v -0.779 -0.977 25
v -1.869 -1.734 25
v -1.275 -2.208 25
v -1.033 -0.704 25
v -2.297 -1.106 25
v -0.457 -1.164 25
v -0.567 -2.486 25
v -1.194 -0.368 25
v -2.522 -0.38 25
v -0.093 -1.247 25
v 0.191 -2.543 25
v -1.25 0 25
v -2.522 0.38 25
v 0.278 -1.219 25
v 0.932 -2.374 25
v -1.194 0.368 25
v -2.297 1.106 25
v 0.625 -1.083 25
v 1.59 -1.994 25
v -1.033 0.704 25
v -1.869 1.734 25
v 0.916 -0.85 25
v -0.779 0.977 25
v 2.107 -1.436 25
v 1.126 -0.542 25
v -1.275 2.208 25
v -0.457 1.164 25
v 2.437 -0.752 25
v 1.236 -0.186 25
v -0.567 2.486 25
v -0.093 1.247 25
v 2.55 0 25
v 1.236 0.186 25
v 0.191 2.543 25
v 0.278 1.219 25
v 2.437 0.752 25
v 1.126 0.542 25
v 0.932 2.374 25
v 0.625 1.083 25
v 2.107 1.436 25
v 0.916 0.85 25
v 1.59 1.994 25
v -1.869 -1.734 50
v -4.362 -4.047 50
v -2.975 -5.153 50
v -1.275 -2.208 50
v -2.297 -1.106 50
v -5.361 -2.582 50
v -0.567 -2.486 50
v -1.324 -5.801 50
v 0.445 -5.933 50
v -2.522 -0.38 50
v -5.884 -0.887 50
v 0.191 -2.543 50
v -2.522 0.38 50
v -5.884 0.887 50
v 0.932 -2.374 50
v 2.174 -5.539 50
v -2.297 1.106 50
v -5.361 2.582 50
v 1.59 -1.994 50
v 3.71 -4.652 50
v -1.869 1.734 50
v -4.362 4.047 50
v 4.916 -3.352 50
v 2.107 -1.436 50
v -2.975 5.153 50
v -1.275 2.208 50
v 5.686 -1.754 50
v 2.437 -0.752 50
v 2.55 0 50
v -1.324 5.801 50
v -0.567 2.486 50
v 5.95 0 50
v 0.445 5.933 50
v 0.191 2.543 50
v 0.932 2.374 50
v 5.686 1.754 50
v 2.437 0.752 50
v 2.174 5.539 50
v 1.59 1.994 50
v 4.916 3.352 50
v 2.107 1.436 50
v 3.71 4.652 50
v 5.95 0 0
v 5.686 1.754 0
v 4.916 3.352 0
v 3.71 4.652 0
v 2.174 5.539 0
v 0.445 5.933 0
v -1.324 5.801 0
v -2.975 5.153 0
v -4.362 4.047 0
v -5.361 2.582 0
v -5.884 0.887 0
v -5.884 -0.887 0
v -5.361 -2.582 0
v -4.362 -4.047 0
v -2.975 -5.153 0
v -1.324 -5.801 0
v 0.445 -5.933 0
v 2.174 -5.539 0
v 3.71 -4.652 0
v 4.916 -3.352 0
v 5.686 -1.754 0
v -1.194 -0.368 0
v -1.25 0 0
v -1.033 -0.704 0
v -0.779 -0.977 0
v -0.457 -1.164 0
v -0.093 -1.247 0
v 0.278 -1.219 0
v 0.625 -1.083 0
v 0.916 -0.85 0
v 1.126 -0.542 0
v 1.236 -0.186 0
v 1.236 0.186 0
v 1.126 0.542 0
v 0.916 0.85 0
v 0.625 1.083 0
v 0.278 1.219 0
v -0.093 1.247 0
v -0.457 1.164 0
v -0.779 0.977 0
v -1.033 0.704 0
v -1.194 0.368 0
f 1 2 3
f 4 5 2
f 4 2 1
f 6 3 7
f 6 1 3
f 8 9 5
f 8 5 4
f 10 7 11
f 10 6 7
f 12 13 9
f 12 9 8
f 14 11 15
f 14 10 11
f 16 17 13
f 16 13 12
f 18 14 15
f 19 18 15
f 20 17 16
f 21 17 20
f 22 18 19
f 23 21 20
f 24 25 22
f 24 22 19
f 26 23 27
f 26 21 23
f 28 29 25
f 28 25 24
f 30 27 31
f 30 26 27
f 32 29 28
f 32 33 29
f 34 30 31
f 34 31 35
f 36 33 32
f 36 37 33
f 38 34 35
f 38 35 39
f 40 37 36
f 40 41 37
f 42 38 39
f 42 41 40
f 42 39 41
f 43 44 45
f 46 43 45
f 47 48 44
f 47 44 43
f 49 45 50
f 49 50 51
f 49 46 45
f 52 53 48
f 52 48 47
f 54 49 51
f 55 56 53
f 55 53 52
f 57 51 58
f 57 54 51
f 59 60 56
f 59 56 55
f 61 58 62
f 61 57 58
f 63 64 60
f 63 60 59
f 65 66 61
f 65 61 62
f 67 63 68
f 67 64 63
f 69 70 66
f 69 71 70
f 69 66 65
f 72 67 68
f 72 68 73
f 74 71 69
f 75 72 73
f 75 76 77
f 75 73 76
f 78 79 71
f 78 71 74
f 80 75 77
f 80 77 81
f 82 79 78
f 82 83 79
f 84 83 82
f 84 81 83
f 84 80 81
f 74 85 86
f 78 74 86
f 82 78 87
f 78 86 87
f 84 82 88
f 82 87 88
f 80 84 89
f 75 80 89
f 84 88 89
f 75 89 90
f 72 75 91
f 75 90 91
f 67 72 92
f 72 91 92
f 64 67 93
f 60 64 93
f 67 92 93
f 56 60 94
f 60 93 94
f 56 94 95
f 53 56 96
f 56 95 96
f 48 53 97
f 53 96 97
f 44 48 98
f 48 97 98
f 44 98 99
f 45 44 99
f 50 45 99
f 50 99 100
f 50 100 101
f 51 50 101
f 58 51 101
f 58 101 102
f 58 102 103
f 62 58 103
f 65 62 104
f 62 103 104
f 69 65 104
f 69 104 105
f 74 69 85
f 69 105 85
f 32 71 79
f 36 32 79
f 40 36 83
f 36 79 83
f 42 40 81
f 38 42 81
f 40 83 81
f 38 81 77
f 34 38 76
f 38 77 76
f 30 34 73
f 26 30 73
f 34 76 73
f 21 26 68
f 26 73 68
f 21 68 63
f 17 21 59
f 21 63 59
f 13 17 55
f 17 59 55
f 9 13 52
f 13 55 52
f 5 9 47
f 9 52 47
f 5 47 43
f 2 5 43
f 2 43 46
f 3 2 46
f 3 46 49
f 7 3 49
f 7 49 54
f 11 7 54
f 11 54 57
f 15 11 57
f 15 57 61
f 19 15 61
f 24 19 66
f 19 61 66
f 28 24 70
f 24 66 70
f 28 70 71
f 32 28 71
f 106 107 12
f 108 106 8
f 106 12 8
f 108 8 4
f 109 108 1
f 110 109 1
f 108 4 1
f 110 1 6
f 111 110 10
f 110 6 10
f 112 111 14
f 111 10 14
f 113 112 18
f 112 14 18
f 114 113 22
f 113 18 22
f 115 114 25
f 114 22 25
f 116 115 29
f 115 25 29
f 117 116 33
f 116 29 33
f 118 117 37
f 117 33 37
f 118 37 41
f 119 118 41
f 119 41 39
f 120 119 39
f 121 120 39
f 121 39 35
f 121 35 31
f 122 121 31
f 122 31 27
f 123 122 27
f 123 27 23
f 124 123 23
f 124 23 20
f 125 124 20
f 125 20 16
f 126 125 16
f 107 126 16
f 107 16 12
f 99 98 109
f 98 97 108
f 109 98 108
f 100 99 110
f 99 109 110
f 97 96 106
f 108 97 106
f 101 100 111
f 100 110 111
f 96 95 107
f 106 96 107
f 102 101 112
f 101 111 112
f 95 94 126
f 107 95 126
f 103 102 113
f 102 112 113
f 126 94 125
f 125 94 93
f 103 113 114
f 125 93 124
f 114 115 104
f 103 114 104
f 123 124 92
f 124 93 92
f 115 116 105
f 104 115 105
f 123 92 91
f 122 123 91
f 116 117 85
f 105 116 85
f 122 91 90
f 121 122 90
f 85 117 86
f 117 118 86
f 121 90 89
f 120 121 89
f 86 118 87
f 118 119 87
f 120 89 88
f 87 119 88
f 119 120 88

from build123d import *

# Parameters (mm, degrees)
F0_R     = 5.95
F1_DEPTH = 50
F3_D     = 2.5
F4_R     = 2.55
F4_R_2   = 1.25
F5_DEPTH = 25


with BuildPart() as f1:
    # F0 (on Top) → F1 (new body)
    with BuildSketch(Plane.XY):
        Circle(F0_R)
    extrude(amount=F1_DEPTH)

    # F3 (through all)
    with Locations(Plane(origin=(0, 0, 0), x_dir=(1, 0, 0), z_dir=(0, 0, -1))):
        with Locations((0, 0)):
            Hole(F3_D / 2)

    # F4 (on face) → F5 (cut)
    with BuildSketch(Plane.XY.offset(50)):
        Circle(F4_R)
        Circle(F4_R_2, mode=Mode.SUBTRACT)
    extrude(amount=-F5_DEPTH, mode=Mode.SUBTRACT)


solid = f1.part
